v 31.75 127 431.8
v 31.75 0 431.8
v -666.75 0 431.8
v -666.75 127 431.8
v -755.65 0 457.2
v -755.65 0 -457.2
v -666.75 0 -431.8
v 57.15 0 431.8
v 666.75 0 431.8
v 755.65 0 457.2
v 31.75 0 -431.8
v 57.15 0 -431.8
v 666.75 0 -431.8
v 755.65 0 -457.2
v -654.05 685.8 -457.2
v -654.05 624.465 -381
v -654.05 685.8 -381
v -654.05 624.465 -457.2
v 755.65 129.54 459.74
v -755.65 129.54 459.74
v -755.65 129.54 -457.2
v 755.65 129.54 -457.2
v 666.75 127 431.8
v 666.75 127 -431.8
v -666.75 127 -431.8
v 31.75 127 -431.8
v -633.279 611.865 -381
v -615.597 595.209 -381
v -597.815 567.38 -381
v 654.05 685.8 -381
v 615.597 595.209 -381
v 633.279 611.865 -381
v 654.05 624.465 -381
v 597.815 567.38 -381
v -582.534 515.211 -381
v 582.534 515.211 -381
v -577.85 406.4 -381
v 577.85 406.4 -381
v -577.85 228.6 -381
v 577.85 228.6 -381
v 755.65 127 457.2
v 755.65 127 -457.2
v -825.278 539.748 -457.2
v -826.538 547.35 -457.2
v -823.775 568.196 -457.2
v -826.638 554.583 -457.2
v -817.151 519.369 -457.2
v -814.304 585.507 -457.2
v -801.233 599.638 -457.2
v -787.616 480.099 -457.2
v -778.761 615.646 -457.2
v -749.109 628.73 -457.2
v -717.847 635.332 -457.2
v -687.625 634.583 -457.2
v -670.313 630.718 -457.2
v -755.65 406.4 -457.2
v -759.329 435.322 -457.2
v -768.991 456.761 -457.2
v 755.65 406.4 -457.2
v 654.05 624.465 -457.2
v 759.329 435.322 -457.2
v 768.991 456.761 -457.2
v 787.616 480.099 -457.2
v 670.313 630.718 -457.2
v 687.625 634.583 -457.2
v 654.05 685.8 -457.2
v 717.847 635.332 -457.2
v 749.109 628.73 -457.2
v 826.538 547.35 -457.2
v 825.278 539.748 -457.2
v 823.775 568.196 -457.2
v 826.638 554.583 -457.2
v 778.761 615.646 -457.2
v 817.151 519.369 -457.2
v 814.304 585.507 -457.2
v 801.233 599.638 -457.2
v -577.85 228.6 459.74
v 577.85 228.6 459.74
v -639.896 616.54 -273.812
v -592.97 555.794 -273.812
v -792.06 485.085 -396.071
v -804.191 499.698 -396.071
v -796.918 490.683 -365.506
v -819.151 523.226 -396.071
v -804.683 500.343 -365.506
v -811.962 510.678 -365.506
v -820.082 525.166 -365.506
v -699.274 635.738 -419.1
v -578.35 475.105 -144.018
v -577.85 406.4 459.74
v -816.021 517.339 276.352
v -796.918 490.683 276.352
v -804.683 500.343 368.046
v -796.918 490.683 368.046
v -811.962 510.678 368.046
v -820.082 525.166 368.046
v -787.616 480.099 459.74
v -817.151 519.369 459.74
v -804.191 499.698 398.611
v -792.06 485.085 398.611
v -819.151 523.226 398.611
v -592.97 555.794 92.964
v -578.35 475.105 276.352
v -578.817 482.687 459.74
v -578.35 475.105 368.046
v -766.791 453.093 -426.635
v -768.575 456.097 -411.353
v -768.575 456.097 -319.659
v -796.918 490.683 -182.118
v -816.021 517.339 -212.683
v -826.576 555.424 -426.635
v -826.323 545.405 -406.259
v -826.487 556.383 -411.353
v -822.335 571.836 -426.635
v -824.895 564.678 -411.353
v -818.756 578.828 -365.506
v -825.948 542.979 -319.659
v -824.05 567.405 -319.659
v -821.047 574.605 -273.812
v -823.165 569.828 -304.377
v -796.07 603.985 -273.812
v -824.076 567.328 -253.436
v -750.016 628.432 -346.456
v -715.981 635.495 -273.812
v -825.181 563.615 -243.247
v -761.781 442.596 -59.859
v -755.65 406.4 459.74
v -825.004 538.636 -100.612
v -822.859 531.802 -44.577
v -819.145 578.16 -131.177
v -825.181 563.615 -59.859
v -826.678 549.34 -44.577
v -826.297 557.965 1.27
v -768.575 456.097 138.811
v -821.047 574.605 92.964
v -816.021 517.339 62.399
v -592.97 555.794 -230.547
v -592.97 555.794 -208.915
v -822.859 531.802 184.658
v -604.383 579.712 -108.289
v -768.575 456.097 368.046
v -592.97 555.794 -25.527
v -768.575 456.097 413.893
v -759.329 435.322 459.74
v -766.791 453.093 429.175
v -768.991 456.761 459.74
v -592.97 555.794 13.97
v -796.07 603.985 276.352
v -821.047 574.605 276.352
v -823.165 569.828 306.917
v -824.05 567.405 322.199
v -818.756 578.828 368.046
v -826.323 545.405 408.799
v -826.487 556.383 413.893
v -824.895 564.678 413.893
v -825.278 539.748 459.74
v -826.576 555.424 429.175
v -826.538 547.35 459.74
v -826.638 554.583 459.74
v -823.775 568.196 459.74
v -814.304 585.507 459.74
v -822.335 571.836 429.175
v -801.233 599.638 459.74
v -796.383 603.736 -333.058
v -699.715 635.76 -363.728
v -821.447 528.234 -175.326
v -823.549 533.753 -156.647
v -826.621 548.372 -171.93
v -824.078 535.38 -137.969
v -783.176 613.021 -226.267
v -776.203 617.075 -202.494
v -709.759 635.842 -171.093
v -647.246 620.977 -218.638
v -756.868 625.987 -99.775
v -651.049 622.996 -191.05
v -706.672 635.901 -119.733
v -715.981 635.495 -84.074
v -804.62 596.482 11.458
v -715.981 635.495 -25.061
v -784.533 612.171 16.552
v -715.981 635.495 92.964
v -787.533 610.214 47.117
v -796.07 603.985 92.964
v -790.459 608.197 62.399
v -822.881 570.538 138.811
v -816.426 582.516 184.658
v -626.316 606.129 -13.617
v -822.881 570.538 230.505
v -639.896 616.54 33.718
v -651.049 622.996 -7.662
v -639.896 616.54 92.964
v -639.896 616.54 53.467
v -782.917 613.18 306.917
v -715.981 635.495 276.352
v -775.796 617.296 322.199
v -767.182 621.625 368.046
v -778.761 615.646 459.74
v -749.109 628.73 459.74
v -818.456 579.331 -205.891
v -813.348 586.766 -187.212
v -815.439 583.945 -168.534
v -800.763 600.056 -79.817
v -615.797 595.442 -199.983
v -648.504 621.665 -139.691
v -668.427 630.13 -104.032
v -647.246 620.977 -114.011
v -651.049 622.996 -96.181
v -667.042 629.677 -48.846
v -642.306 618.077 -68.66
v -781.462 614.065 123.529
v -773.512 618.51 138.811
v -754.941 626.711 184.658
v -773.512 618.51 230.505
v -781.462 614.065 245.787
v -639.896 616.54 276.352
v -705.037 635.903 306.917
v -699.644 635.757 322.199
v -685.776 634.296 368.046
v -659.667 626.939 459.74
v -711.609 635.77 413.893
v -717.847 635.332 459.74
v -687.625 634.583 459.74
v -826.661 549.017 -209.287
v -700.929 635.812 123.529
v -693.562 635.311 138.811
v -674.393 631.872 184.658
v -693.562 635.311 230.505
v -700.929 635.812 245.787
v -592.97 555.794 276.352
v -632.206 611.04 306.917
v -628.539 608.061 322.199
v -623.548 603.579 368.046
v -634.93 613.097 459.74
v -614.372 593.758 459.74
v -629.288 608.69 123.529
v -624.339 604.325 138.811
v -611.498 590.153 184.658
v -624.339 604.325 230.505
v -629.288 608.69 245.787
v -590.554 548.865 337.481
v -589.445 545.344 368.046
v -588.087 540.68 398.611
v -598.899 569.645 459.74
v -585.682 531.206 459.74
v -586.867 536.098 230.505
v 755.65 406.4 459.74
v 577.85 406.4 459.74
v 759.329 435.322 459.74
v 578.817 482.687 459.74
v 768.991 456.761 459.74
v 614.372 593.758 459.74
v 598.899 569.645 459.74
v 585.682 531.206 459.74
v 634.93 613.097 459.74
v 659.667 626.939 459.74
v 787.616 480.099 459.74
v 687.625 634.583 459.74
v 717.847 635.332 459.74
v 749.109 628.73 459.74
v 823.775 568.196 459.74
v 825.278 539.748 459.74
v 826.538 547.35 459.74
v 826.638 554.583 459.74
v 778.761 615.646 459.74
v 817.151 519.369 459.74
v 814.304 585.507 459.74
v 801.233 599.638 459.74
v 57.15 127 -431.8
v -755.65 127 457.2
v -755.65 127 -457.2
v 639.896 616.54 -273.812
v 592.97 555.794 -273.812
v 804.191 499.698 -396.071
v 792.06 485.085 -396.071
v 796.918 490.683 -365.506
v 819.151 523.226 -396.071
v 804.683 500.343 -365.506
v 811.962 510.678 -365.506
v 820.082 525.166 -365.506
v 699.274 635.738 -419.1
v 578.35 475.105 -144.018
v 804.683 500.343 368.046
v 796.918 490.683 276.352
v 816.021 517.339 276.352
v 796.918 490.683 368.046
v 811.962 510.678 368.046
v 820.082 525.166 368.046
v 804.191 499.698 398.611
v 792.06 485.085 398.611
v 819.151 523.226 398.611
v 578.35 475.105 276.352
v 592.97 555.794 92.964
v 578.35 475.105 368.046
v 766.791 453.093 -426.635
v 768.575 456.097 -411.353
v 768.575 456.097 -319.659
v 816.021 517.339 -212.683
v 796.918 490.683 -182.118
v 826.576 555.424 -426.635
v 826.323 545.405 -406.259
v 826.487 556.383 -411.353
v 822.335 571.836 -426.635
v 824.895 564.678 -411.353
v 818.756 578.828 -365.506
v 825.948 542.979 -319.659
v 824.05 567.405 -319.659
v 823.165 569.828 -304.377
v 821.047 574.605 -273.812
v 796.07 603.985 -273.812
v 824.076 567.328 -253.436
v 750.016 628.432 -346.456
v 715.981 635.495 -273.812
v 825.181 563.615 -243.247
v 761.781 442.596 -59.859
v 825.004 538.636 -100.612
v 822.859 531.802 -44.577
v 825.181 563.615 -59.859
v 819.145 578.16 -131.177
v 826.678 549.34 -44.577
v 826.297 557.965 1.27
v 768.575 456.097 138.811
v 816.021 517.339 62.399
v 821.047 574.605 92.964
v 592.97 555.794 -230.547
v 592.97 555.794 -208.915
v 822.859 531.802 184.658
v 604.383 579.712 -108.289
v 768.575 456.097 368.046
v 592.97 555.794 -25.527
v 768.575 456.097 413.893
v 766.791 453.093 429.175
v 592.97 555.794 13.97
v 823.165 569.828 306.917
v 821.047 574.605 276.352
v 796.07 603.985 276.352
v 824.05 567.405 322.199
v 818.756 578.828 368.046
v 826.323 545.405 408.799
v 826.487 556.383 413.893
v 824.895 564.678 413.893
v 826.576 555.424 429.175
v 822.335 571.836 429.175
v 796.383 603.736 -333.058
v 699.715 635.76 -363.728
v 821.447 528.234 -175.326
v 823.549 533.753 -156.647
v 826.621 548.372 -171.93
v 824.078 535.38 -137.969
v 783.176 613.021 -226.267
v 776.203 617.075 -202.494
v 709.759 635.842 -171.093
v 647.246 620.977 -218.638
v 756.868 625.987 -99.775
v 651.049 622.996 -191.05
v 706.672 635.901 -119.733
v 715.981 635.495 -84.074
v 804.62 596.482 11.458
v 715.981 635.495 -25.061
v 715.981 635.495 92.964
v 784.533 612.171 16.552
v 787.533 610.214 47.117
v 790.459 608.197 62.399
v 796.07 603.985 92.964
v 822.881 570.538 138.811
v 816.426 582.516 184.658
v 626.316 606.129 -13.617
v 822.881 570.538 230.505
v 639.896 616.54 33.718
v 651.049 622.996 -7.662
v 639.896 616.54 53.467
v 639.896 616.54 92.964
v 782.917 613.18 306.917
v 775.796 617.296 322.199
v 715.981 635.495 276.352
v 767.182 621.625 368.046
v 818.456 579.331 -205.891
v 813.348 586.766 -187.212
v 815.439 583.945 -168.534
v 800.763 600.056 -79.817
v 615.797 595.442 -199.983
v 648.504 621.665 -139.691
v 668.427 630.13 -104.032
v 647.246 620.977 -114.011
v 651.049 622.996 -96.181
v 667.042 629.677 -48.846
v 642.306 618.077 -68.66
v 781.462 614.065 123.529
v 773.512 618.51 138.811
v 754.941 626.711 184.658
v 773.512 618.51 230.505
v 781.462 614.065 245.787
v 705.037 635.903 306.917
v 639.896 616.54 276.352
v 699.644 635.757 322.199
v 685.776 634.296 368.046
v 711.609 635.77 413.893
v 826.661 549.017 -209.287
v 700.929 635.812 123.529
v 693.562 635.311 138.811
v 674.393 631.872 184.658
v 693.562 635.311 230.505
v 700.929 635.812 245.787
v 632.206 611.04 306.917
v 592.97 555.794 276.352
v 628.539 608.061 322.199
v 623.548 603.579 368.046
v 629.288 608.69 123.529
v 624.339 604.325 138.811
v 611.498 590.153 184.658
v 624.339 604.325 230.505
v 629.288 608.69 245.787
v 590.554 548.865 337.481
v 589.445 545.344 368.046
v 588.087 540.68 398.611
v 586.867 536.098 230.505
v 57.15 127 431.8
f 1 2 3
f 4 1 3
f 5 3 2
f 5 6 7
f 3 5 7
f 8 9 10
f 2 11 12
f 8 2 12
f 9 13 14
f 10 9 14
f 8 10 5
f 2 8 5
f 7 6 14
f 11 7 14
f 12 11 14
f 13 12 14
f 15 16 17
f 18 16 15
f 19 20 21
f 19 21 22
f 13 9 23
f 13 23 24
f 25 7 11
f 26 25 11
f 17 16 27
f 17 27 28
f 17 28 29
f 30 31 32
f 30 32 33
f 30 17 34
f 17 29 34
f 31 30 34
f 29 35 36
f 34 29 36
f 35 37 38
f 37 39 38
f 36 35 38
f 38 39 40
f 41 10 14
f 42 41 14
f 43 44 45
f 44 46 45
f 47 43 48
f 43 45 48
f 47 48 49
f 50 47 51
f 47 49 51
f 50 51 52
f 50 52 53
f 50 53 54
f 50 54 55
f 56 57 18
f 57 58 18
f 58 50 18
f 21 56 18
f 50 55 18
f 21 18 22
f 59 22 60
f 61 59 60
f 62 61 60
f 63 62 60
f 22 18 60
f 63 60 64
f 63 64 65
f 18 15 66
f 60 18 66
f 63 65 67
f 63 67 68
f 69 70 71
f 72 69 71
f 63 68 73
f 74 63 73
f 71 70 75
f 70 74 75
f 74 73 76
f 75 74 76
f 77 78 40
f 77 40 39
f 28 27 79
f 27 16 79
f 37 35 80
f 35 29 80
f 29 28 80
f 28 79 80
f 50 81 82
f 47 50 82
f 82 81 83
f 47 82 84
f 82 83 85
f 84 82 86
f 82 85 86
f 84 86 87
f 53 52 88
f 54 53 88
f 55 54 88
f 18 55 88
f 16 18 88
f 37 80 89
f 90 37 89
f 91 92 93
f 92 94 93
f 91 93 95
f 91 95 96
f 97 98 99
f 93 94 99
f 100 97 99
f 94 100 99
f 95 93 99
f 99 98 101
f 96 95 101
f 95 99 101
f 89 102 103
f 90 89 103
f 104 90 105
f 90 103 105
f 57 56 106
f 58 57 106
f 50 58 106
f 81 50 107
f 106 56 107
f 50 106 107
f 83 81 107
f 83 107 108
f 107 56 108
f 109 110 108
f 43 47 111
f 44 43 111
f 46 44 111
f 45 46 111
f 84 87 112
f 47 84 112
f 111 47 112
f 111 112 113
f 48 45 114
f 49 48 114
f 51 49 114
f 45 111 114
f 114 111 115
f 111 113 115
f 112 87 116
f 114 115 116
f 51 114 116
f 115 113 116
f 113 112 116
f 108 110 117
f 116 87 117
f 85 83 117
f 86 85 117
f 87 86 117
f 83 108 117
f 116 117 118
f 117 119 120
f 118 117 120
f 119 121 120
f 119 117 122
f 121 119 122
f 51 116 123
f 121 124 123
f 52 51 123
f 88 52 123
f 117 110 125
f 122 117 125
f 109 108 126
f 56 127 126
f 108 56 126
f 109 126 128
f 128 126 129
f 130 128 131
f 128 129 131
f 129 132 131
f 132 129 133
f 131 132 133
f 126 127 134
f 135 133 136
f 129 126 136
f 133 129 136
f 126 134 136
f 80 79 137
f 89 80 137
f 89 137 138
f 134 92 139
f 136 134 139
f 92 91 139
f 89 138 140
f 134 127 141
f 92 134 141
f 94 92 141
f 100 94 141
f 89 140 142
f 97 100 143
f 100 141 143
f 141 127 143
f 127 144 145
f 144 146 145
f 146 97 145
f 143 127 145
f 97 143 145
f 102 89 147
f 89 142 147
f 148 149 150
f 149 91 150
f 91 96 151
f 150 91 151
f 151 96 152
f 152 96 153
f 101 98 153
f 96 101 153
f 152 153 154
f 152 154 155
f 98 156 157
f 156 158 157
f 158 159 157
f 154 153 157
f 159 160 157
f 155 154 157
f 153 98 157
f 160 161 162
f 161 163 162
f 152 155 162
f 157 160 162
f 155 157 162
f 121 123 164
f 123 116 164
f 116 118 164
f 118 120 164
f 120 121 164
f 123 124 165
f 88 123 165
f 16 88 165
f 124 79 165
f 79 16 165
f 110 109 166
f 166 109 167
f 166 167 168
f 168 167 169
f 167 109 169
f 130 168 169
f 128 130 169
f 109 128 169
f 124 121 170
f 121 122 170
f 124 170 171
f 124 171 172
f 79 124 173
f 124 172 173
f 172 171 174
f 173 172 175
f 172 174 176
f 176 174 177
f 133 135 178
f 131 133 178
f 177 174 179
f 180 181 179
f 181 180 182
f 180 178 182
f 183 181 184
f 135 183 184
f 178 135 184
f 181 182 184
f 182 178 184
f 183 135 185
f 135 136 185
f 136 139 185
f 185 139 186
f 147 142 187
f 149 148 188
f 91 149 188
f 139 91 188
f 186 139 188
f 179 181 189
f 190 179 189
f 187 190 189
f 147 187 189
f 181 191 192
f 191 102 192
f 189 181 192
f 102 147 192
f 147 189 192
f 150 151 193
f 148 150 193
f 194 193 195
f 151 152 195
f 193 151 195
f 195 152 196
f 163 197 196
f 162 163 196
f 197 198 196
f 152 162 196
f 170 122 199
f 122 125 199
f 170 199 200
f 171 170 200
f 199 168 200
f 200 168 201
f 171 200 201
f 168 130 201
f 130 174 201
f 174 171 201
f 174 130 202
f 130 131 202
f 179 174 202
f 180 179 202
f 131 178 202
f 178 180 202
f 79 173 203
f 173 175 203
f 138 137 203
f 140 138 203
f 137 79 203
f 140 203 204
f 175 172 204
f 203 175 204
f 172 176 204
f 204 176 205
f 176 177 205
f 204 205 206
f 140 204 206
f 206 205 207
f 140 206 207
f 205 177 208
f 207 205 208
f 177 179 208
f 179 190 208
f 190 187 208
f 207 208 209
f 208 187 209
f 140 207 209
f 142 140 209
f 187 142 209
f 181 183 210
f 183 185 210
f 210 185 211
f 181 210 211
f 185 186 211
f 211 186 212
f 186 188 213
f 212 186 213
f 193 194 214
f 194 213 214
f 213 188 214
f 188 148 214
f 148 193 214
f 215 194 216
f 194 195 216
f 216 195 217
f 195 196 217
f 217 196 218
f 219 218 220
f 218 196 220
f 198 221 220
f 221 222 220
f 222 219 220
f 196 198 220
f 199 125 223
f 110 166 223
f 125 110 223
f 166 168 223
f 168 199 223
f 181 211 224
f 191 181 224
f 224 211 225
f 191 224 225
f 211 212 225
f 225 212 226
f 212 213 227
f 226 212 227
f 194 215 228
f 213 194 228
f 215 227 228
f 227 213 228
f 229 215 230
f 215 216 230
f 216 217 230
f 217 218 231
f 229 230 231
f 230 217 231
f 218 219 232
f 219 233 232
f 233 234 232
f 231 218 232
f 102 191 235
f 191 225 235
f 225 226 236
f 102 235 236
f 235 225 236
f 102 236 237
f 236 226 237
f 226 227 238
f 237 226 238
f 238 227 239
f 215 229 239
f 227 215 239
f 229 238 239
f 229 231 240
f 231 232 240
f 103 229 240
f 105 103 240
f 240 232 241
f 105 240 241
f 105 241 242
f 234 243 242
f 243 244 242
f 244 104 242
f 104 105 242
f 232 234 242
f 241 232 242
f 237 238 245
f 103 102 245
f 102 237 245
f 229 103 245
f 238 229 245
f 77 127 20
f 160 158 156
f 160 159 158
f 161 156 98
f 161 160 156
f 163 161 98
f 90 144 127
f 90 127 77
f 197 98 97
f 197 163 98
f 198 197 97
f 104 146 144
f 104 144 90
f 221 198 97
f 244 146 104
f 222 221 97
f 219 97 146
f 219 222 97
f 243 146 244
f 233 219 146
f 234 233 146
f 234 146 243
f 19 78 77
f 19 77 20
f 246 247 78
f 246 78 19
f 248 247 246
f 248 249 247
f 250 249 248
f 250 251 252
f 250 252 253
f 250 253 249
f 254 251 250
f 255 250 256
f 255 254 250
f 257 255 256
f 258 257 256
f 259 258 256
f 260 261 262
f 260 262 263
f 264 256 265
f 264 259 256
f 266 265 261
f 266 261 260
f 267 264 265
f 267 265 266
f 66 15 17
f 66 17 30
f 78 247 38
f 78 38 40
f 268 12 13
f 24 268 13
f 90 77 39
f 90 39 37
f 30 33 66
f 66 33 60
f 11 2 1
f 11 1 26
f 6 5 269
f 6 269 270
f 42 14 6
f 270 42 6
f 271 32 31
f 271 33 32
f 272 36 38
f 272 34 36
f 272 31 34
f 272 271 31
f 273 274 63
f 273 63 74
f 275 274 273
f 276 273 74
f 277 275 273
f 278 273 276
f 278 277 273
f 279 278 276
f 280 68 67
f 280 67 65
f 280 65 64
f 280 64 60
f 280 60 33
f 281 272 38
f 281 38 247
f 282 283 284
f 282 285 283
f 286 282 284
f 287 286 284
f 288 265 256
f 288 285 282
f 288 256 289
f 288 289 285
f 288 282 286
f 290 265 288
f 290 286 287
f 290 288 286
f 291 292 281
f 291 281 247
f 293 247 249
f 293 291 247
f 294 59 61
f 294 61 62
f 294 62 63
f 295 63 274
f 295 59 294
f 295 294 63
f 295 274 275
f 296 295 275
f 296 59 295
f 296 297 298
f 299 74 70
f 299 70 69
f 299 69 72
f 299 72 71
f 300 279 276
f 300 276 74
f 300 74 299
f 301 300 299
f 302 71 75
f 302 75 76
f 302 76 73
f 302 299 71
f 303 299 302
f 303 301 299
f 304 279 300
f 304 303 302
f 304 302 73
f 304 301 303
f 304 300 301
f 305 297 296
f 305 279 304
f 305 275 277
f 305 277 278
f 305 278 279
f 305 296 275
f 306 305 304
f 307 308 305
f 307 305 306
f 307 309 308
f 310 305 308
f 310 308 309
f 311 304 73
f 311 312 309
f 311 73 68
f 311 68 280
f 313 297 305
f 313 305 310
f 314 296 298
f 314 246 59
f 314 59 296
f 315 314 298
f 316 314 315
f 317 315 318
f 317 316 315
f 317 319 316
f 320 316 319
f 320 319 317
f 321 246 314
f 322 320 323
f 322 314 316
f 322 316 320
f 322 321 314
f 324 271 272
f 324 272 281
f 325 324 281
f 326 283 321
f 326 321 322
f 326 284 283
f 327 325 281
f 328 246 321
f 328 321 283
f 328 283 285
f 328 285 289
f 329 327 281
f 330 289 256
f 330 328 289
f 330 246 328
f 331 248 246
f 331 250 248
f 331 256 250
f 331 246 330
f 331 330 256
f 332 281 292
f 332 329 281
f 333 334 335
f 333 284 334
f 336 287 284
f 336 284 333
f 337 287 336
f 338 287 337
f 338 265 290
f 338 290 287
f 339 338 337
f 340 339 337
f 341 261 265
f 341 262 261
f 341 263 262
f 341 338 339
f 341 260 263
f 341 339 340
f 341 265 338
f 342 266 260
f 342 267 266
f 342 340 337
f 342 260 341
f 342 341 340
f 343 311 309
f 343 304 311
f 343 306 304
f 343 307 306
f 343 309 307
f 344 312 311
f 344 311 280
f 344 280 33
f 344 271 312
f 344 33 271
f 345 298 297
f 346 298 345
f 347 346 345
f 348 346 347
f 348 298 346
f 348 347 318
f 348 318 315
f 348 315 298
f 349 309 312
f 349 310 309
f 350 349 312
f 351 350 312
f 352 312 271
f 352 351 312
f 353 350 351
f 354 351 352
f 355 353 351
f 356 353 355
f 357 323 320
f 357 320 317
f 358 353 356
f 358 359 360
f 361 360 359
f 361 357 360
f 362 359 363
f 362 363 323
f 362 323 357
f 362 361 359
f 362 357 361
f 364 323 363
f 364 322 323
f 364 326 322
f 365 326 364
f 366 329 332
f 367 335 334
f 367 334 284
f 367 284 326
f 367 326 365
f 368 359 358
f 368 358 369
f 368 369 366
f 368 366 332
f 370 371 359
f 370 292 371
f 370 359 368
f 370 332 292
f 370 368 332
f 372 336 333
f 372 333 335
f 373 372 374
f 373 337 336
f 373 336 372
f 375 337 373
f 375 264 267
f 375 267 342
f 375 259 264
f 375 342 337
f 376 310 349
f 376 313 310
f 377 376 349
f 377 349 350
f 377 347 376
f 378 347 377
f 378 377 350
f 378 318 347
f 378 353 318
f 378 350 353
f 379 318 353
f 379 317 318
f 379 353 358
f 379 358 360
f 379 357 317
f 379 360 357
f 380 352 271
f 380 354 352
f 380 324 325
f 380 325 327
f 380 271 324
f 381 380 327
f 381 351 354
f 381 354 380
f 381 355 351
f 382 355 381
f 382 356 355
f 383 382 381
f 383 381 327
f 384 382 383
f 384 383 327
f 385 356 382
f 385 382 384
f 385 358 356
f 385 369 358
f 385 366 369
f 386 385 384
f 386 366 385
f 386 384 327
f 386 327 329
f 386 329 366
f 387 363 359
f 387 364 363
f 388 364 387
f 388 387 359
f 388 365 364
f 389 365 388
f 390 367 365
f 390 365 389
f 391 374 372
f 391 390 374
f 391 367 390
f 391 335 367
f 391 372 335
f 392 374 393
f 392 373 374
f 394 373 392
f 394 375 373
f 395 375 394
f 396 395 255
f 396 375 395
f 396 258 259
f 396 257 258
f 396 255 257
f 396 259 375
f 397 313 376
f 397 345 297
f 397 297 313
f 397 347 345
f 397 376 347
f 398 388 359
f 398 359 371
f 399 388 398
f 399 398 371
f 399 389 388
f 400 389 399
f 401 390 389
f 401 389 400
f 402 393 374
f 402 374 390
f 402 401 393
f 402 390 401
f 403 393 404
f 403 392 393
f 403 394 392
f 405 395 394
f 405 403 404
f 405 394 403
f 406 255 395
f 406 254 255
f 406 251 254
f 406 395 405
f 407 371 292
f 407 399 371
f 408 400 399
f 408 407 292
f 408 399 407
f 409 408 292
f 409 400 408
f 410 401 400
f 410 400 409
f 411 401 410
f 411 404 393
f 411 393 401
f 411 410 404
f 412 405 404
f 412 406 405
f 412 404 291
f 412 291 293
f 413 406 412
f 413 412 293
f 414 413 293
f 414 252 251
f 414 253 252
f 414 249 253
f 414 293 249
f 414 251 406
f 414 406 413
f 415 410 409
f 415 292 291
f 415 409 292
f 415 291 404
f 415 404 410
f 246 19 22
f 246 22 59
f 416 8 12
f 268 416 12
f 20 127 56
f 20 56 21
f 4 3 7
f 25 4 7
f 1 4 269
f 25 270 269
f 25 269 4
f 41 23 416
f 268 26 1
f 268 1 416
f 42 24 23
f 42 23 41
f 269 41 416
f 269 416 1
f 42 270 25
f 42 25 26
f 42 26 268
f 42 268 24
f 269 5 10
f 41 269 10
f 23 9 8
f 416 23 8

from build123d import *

# Parameters (mm, degrees)
SKETCH1_W           = 88.9
SKETCH1_H           = 914.4
SKETCH1_W_2         = 25.4
SKETCH1_H_2         = 863.6
BOSS_EXTRUDE1_DEPTH = 127
BOSS_EXTRUDE3_DEPTH = 916.94
SKETCH5_W           = 1308.1
SKETCH5_H           = 76.2
BOSS_EXTRUDE4_DEPTH = 457.2


with BuildPart() as part:
    # Sketch1 → Boss-Extrude1 (new body)
    with BuildSketch(Plane(origin=(0, 0, 0), x_dir=(1, 0, 0), z_dir=(0, 1, 0))):
        with Locations((-711.2, 0)):
            Rectangle(SKETCH1_W, SKETCH1_H)
        Polygon((-666.75, -431.8), (-666.75, -457.2), (666.75, -457.2), (666.75, -431.8), (57.15, -431.8), (31.75, -431.8), align=None)
        with Locations((711.2, 0)):
            Rectangle(SKETCH1_W, SKETCH1_H)
        Polygon((666.75, 457.2), (-666.75, 457.2), (-666.75, 431.8), (31.75, 431.8), (57.15, 431.8), (666.75, 431.8), align=None)
        with Locations((44.45, 0)):
            Rectangle(SKETCH1_W_2, SKETCH1_H_2)
    extrude(amount=BOSS_EXTRUDE1_DEPTH)


with BuildPart() as body_2:
    # Sketch4 → Boss-Extrude3 (new body)
    with BuildSketch(Plane.XY.offset(459.74)):
        with BuildLine():
            Line((-755.65, 129.54), (755.65, 129.54))
            Line((755.65, 129.54), (755.65, 406.4))
            add(Edge.make_bspline(
                [(755.65, 406.4), (755.65, 451.087278401), (791.216850954, 477.433435736), (855.398910121, 573.852472449), (720.303655557, 663.232501149), (568.867733776, 589.838855636), (577.85, 447.650661263), (577.85, 406.4)],
                knots=[0, 0, 0, 0, 0.157242683, 0.266642819, 0.492649097, 0.701571925, 1, 1, 1, 1], degree=3))
            Line((577.85, 406.4), (577.85, 228.6))
            Line((577.85, 228.6), (-577.85, 228.6))
            Line((-577.85, 228.6), (-577.85, 406.4))
            add(Edge.make_bspline(
                [(-755.65, 406.4), (-755.65, 451.087278401), (-791.216850954, 477.433435736), (-855.398910121, 573.852472449), (-720.303655557, 663.232501149), (-568.867733776, 589.838855636), (-577.85, 447.650661263), (-577.85, 406.4)],
                knots=[0, 0, 0, 0, 0.157242683, 0.266642819, 0.492649097, 0.701571925, 1, 1, 1, 1], degree=3))
            Line((-755.65, 406.4), (-755.65, 129.54))
        make_face()
    extrude(amount=-BOSS_EXTRUDE3_DEPTH)

    # Sketch5 → Boss-Extrude4 (add)
    with BuildSketch(Plane(origin=(0, 228.6, 0), x_dir=(1, 0, 0), z_dir=(0, 1, 0))):
        with Locations((0, 419.1)):
            Rectangle(SKETCH5_W, SKETCH5_H)
    extrude(amount=BOSS_EXTRUDE4_DEPTH)


solid = Compound([part.part, body_2.part])
